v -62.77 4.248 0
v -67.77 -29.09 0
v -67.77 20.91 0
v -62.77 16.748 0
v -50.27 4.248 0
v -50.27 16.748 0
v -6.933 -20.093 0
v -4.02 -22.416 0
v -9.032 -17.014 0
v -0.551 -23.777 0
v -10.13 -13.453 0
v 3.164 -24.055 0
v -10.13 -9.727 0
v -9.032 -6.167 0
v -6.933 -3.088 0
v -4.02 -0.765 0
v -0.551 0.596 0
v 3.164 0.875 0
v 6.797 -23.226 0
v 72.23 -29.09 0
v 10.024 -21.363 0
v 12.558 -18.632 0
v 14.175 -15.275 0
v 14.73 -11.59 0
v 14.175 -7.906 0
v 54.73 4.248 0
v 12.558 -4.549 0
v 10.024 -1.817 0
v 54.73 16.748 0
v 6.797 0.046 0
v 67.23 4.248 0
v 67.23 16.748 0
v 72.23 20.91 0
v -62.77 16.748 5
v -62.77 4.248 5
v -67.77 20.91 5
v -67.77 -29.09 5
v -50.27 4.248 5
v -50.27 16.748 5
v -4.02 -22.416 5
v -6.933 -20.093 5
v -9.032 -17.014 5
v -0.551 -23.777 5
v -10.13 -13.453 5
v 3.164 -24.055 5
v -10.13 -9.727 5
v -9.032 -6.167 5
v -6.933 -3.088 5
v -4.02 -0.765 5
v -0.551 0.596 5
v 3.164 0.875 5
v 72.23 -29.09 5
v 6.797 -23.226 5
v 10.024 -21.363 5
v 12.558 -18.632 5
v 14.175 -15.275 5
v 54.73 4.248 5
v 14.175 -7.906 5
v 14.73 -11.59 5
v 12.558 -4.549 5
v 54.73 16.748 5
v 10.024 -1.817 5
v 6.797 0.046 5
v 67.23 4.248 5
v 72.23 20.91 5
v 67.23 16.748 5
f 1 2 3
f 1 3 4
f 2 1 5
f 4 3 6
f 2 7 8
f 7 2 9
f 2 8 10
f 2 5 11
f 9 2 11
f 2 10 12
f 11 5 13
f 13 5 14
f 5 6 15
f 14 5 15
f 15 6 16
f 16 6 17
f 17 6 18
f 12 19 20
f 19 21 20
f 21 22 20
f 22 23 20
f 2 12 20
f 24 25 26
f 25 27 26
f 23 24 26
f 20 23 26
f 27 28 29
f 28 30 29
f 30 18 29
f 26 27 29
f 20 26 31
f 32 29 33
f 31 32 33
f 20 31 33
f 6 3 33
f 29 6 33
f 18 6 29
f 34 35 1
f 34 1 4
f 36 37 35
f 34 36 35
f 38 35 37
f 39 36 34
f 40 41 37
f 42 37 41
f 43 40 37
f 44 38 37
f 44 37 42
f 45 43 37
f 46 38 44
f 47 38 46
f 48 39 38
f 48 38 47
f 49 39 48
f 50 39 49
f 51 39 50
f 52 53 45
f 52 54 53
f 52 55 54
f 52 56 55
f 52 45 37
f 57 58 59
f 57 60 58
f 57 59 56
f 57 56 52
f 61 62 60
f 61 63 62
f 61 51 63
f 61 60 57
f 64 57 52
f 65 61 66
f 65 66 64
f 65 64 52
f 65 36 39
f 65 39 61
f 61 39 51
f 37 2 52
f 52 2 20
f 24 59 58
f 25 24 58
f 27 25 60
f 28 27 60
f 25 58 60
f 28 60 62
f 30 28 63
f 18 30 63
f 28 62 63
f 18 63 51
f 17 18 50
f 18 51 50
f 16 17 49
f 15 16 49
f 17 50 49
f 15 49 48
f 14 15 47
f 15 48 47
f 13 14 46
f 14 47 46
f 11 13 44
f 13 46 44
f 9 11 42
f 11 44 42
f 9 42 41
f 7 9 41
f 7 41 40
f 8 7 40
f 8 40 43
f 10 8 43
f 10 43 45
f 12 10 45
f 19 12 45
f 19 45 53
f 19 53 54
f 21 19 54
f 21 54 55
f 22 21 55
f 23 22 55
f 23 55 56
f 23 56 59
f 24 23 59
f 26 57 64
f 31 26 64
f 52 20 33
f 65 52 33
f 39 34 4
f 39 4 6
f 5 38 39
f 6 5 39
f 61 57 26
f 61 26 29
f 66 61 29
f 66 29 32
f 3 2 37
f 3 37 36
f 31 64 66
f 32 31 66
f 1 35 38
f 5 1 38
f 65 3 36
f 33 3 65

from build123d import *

# Parameters (mm, degrees)
F0_W     = 140
F0_H     = 50
F1_DEPTH = 5
F2_W     = 12.5
F2_H     = 12.5
F3_DEPTH = 25
F4_R     = 12.5
F5_DEPTH = 25


with BuildPart() as f1:
    # F0 (on Top) → F1 (new body)
    with BuildSketch(Plane.XY):
        with Locations((2.230102, -4.090368)):
            Rectangle(F0_W, F0_H)
    extrude(amount=F1_DEPTH)

    # F2 (on face) → F3 (cut)
    with BuildSketch(Plane.XY.offset(5)):
        with Locations((-56.519898, 10.497632)):
            Rectangle(F2_W, F2_H)
        with Locations((60.980102, 10.497632)):
            Rectangle(F2_W, F2_H)
    extrude(amount=-F3_DEPTH, mode=Mode.SUBTRACT)

    # F4 (on face) → F5 (cut)
    with BuildSketch(Plane.XY.offset(5)):
        with Locations((2.230102, -11.590368)):
            Circle(F4_R)
    extrude(amount=-F5_DEPTH, mode=Mode.SUBTRACT)


solid = f1.part
